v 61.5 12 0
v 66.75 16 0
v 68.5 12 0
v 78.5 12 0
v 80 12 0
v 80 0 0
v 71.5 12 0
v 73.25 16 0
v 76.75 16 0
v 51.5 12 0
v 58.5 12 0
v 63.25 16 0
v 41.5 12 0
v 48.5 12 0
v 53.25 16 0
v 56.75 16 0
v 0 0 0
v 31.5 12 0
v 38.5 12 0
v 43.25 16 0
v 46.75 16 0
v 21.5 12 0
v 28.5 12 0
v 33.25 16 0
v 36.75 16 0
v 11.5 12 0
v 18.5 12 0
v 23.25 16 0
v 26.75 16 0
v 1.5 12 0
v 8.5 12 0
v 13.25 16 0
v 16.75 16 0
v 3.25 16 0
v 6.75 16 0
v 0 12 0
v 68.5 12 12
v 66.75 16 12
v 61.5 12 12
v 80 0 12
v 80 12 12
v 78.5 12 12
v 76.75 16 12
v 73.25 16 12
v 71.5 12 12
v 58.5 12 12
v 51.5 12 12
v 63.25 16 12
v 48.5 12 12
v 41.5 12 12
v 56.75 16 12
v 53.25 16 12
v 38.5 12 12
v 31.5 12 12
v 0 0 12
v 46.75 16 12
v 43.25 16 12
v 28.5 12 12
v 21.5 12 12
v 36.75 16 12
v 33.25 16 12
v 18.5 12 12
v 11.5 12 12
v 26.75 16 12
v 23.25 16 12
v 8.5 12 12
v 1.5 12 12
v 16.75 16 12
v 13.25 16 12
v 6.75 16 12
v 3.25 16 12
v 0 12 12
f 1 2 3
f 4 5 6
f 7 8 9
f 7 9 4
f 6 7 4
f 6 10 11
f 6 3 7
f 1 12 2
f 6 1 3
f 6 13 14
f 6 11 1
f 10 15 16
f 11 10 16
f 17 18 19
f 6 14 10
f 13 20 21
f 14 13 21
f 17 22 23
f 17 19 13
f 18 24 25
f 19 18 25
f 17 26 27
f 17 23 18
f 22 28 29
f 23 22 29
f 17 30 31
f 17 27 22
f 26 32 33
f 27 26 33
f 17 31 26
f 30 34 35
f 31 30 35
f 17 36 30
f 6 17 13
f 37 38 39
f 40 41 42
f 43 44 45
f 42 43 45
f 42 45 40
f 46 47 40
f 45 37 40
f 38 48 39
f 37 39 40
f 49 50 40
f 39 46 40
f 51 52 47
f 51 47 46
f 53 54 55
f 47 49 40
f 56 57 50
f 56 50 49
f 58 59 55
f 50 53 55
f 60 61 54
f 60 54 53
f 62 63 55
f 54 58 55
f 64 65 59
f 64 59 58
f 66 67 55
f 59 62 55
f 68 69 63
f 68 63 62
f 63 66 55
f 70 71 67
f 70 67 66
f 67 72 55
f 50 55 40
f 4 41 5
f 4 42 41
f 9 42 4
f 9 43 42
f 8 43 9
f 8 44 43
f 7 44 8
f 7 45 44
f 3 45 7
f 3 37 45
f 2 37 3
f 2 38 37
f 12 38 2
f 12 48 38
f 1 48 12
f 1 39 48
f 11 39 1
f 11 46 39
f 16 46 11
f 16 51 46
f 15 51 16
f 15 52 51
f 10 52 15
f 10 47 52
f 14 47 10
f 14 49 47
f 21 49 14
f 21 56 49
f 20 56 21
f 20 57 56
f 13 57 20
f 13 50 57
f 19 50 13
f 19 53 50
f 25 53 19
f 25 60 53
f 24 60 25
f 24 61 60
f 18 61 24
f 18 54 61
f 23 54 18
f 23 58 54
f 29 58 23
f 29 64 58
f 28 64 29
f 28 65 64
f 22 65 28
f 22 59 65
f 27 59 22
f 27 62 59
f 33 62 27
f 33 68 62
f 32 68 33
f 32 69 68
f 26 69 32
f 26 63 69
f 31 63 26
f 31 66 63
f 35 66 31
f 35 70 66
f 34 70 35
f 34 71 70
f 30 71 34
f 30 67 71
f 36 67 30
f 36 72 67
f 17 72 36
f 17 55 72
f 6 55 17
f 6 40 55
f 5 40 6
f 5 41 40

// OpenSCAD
$fn = 32;

// ----------------------------------------------------------------------
// Gear rack: 8 teeth, pitch 10 mm
// ----------------------------------------------------------------------

// --- parameters (mm) ---
teeth = 8;                // number of teeth
pitch = 10;               // tooth pitch, X
root_w = 7;               // tooth width at the root
tip_w = 3.5;              // tooth width at the tip
base_h = 12;              // rack body height, Y
tooth_h = 4;              // tooth height above the body
plate_t = 12;             // rack width, Z (extrusion height)

rack_l = teeth * pitch;  // overall length
total_h = base_h + tooth_h;  // overall height

profile = [[0, 0], [80, 0], [80, 12], [78.5, 12], [76.75, 16], [73.25, 16], [71.5, 12], [68.5, 12], [66.75, 16], [63.25, 16], [61.5, 12], [58.5, 12], [56.75, 16], [53.25, 16], [51.5, 12], [48.5, 12], [46.75, 16], [43.25, 16], [41.5, 12], [38.5, 12], [36.75, 16], [33.25, 16], [31.5, 12], [28.5, 12], [26.75, 16], [23.25, 16], [21.5, 12], [18.5, 12], [16.75, 16], [13.25, 16], [11.5, 12], [8.5, 12], [6.75, 16], [3.25, 16], [1.5, 12], [0, 12]];  // primary outline, 36 points, counter clockwise

// --- the one profile operation ---
linear_extrude(height = plate_t) polygon(points = profile);
